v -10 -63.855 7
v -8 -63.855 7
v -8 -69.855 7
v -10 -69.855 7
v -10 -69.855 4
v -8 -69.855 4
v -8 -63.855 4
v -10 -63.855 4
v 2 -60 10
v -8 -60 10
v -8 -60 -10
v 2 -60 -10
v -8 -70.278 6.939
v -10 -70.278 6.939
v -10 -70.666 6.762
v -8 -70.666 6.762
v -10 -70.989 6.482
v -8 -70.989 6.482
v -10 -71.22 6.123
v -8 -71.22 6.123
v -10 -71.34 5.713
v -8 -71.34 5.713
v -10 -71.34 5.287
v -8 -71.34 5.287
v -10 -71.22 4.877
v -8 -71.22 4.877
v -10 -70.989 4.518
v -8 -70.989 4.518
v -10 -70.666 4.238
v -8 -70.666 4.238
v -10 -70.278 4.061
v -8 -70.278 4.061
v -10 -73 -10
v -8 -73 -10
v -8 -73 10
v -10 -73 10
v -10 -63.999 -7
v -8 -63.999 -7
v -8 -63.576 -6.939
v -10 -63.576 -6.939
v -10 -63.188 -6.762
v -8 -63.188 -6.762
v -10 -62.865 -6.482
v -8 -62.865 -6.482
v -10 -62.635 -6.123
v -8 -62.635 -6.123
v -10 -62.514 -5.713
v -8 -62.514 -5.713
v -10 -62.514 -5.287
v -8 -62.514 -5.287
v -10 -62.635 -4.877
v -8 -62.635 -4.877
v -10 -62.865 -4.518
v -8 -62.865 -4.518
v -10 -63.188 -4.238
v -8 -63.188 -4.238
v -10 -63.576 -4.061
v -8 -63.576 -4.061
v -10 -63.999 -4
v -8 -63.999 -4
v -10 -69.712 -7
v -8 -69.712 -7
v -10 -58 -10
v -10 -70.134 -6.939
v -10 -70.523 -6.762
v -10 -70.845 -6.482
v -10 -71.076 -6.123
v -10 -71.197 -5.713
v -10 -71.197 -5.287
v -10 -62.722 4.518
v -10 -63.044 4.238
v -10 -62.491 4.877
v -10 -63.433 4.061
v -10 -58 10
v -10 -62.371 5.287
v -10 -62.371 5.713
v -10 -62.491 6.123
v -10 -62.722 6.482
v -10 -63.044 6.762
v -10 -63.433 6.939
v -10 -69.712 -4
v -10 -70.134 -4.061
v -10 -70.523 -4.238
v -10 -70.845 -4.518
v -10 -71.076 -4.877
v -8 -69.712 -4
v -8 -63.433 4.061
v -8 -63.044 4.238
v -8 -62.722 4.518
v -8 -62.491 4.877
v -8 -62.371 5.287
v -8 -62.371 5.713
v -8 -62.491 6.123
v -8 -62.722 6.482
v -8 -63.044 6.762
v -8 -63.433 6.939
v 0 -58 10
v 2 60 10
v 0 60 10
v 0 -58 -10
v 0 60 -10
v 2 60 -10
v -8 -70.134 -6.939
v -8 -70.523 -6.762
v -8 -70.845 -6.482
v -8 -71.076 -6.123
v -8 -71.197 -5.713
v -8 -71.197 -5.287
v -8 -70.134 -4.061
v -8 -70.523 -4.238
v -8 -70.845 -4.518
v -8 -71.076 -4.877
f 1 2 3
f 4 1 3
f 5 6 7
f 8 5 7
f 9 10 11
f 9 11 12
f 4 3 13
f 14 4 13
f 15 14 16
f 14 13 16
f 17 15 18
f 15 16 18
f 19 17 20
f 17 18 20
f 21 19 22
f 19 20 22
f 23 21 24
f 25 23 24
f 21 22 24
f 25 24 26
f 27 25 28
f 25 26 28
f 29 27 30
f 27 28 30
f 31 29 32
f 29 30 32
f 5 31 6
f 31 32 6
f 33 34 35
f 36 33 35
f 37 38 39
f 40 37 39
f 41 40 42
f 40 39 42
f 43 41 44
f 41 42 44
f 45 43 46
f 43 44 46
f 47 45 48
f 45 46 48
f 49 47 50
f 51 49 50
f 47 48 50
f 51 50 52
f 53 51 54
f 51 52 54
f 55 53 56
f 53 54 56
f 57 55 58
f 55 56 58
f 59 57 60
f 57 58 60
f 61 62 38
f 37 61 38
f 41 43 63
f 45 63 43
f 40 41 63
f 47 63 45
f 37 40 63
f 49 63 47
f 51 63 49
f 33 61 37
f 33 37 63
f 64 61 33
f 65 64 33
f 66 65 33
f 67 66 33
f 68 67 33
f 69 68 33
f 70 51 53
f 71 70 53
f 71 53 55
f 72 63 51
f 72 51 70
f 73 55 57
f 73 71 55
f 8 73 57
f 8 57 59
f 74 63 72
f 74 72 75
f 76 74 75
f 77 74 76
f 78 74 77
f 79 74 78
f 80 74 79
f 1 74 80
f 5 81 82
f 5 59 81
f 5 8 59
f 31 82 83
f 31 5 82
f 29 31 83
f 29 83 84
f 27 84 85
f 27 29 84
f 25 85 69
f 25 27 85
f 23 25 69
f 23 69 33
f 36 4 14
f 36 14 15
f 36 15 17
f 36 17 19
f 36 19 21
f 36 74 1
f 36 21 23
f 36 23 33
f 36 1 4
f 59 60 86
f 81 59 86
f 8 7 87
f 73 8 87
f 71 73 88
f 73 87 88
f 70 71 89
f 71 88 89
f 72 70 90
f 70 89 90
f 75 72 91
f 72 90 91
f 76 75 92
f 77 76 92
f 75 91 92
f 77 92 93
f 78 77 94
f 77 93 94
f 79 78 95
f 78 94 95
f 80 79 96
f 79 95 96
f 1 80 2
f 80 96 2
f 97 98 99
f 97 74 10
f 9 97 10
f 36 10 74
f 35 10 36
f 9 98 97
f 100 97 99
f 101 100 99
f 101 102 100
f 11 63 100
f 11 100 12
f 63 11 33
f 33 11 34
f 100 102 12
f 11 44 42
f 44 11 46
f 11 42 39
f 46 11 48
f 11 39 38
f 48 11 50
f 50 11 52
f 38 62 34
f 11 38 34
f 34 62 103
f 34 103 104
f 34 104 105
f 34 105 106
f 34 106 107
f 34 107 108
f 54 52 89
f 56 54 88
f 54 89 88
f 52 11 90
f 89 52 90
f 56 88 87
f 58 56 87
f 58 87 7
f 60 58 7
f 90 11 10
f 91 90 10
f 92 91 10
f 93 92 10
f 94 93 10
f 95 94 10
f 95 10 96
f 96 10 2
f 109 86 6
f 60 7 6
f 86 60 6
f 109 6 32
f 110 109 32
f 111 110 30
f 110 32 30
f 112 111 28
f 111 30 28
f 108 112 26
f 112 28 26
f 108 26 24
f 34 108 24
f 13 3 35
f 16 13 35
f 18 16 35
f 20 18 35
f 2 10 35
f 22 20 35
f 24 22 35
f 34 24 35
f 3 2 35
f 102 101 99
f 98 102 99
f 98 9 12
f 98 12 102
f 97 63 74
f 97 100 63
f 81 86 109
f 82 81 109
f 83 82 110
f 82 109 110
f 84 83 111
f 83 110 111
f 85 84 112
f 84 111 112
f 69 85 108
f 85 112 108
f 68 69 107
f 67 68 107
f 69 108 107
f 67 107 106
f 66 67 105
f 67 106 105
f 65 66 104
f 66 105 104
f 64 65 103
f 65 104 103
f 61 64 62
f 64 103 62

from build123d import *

# Parameters (mm, degrees)
F0_W     = 120
F0_H     = 20
F1_DEPTH = 2
F2_W     = 8
F2_H     = 20
F3_DEPTH = 2
F4_W     = 15
F4_H     = 20
F5_DEPTH = 2


with BuildPart() as f1:
    # F0 (on Right) → F1 (new body)
    with BuildSketch(Plane.YZ):
        Rectangle(F0_W, F0_H)
    extrude(amount=F1_DEPTH)

    # F2 (on face) → F3 (join)
    with BuildSketch(Plane.XZ.offset(60)):
        with Locations((-4, 0)):
            Rectangle(F2_W, F2_H)
    extrude(amount=-F3_DEPTH)

    # F4 (on face) → F5 (join)
    with BuildSketch(Plane(origin=(-8, 0, 0), x_dir=(0, -1, 0), z_dir=(-1, 0, 0))):
        with Locations((65.5, 0)):
            Rectangle(F4_W, F4_H)
        with BuildLine():
            Line((69.711817, -7), (63.999042, -7))
            ThreePointArc((63.999042, -7), (62.499042, -5.5), (63.999042, -4))
            Line((63.999042, -4), (69.711817, -4))
            ThreePointArc((69.711817, -4), (71.211817, -5.5), (69.711817, -7))
        make_face(mode=Mode.SUBTRACT)
        with BuildLine():
            Line((69.855429, 4), (63.855429, 4))
            ThreePointArc((63.855429, 4), (62.355429, 5.5), (63.855429, 7))
            Line((63.855429, 7), (69.855429, 7))
            ThreePointArc((69.855429, 7), (71.355429, 5.5), (69.855429, 4))
        make_face(mode=Mode.SUBTRACT)
    extrude(amount=F5_DEPTH)


solid = f1.part
